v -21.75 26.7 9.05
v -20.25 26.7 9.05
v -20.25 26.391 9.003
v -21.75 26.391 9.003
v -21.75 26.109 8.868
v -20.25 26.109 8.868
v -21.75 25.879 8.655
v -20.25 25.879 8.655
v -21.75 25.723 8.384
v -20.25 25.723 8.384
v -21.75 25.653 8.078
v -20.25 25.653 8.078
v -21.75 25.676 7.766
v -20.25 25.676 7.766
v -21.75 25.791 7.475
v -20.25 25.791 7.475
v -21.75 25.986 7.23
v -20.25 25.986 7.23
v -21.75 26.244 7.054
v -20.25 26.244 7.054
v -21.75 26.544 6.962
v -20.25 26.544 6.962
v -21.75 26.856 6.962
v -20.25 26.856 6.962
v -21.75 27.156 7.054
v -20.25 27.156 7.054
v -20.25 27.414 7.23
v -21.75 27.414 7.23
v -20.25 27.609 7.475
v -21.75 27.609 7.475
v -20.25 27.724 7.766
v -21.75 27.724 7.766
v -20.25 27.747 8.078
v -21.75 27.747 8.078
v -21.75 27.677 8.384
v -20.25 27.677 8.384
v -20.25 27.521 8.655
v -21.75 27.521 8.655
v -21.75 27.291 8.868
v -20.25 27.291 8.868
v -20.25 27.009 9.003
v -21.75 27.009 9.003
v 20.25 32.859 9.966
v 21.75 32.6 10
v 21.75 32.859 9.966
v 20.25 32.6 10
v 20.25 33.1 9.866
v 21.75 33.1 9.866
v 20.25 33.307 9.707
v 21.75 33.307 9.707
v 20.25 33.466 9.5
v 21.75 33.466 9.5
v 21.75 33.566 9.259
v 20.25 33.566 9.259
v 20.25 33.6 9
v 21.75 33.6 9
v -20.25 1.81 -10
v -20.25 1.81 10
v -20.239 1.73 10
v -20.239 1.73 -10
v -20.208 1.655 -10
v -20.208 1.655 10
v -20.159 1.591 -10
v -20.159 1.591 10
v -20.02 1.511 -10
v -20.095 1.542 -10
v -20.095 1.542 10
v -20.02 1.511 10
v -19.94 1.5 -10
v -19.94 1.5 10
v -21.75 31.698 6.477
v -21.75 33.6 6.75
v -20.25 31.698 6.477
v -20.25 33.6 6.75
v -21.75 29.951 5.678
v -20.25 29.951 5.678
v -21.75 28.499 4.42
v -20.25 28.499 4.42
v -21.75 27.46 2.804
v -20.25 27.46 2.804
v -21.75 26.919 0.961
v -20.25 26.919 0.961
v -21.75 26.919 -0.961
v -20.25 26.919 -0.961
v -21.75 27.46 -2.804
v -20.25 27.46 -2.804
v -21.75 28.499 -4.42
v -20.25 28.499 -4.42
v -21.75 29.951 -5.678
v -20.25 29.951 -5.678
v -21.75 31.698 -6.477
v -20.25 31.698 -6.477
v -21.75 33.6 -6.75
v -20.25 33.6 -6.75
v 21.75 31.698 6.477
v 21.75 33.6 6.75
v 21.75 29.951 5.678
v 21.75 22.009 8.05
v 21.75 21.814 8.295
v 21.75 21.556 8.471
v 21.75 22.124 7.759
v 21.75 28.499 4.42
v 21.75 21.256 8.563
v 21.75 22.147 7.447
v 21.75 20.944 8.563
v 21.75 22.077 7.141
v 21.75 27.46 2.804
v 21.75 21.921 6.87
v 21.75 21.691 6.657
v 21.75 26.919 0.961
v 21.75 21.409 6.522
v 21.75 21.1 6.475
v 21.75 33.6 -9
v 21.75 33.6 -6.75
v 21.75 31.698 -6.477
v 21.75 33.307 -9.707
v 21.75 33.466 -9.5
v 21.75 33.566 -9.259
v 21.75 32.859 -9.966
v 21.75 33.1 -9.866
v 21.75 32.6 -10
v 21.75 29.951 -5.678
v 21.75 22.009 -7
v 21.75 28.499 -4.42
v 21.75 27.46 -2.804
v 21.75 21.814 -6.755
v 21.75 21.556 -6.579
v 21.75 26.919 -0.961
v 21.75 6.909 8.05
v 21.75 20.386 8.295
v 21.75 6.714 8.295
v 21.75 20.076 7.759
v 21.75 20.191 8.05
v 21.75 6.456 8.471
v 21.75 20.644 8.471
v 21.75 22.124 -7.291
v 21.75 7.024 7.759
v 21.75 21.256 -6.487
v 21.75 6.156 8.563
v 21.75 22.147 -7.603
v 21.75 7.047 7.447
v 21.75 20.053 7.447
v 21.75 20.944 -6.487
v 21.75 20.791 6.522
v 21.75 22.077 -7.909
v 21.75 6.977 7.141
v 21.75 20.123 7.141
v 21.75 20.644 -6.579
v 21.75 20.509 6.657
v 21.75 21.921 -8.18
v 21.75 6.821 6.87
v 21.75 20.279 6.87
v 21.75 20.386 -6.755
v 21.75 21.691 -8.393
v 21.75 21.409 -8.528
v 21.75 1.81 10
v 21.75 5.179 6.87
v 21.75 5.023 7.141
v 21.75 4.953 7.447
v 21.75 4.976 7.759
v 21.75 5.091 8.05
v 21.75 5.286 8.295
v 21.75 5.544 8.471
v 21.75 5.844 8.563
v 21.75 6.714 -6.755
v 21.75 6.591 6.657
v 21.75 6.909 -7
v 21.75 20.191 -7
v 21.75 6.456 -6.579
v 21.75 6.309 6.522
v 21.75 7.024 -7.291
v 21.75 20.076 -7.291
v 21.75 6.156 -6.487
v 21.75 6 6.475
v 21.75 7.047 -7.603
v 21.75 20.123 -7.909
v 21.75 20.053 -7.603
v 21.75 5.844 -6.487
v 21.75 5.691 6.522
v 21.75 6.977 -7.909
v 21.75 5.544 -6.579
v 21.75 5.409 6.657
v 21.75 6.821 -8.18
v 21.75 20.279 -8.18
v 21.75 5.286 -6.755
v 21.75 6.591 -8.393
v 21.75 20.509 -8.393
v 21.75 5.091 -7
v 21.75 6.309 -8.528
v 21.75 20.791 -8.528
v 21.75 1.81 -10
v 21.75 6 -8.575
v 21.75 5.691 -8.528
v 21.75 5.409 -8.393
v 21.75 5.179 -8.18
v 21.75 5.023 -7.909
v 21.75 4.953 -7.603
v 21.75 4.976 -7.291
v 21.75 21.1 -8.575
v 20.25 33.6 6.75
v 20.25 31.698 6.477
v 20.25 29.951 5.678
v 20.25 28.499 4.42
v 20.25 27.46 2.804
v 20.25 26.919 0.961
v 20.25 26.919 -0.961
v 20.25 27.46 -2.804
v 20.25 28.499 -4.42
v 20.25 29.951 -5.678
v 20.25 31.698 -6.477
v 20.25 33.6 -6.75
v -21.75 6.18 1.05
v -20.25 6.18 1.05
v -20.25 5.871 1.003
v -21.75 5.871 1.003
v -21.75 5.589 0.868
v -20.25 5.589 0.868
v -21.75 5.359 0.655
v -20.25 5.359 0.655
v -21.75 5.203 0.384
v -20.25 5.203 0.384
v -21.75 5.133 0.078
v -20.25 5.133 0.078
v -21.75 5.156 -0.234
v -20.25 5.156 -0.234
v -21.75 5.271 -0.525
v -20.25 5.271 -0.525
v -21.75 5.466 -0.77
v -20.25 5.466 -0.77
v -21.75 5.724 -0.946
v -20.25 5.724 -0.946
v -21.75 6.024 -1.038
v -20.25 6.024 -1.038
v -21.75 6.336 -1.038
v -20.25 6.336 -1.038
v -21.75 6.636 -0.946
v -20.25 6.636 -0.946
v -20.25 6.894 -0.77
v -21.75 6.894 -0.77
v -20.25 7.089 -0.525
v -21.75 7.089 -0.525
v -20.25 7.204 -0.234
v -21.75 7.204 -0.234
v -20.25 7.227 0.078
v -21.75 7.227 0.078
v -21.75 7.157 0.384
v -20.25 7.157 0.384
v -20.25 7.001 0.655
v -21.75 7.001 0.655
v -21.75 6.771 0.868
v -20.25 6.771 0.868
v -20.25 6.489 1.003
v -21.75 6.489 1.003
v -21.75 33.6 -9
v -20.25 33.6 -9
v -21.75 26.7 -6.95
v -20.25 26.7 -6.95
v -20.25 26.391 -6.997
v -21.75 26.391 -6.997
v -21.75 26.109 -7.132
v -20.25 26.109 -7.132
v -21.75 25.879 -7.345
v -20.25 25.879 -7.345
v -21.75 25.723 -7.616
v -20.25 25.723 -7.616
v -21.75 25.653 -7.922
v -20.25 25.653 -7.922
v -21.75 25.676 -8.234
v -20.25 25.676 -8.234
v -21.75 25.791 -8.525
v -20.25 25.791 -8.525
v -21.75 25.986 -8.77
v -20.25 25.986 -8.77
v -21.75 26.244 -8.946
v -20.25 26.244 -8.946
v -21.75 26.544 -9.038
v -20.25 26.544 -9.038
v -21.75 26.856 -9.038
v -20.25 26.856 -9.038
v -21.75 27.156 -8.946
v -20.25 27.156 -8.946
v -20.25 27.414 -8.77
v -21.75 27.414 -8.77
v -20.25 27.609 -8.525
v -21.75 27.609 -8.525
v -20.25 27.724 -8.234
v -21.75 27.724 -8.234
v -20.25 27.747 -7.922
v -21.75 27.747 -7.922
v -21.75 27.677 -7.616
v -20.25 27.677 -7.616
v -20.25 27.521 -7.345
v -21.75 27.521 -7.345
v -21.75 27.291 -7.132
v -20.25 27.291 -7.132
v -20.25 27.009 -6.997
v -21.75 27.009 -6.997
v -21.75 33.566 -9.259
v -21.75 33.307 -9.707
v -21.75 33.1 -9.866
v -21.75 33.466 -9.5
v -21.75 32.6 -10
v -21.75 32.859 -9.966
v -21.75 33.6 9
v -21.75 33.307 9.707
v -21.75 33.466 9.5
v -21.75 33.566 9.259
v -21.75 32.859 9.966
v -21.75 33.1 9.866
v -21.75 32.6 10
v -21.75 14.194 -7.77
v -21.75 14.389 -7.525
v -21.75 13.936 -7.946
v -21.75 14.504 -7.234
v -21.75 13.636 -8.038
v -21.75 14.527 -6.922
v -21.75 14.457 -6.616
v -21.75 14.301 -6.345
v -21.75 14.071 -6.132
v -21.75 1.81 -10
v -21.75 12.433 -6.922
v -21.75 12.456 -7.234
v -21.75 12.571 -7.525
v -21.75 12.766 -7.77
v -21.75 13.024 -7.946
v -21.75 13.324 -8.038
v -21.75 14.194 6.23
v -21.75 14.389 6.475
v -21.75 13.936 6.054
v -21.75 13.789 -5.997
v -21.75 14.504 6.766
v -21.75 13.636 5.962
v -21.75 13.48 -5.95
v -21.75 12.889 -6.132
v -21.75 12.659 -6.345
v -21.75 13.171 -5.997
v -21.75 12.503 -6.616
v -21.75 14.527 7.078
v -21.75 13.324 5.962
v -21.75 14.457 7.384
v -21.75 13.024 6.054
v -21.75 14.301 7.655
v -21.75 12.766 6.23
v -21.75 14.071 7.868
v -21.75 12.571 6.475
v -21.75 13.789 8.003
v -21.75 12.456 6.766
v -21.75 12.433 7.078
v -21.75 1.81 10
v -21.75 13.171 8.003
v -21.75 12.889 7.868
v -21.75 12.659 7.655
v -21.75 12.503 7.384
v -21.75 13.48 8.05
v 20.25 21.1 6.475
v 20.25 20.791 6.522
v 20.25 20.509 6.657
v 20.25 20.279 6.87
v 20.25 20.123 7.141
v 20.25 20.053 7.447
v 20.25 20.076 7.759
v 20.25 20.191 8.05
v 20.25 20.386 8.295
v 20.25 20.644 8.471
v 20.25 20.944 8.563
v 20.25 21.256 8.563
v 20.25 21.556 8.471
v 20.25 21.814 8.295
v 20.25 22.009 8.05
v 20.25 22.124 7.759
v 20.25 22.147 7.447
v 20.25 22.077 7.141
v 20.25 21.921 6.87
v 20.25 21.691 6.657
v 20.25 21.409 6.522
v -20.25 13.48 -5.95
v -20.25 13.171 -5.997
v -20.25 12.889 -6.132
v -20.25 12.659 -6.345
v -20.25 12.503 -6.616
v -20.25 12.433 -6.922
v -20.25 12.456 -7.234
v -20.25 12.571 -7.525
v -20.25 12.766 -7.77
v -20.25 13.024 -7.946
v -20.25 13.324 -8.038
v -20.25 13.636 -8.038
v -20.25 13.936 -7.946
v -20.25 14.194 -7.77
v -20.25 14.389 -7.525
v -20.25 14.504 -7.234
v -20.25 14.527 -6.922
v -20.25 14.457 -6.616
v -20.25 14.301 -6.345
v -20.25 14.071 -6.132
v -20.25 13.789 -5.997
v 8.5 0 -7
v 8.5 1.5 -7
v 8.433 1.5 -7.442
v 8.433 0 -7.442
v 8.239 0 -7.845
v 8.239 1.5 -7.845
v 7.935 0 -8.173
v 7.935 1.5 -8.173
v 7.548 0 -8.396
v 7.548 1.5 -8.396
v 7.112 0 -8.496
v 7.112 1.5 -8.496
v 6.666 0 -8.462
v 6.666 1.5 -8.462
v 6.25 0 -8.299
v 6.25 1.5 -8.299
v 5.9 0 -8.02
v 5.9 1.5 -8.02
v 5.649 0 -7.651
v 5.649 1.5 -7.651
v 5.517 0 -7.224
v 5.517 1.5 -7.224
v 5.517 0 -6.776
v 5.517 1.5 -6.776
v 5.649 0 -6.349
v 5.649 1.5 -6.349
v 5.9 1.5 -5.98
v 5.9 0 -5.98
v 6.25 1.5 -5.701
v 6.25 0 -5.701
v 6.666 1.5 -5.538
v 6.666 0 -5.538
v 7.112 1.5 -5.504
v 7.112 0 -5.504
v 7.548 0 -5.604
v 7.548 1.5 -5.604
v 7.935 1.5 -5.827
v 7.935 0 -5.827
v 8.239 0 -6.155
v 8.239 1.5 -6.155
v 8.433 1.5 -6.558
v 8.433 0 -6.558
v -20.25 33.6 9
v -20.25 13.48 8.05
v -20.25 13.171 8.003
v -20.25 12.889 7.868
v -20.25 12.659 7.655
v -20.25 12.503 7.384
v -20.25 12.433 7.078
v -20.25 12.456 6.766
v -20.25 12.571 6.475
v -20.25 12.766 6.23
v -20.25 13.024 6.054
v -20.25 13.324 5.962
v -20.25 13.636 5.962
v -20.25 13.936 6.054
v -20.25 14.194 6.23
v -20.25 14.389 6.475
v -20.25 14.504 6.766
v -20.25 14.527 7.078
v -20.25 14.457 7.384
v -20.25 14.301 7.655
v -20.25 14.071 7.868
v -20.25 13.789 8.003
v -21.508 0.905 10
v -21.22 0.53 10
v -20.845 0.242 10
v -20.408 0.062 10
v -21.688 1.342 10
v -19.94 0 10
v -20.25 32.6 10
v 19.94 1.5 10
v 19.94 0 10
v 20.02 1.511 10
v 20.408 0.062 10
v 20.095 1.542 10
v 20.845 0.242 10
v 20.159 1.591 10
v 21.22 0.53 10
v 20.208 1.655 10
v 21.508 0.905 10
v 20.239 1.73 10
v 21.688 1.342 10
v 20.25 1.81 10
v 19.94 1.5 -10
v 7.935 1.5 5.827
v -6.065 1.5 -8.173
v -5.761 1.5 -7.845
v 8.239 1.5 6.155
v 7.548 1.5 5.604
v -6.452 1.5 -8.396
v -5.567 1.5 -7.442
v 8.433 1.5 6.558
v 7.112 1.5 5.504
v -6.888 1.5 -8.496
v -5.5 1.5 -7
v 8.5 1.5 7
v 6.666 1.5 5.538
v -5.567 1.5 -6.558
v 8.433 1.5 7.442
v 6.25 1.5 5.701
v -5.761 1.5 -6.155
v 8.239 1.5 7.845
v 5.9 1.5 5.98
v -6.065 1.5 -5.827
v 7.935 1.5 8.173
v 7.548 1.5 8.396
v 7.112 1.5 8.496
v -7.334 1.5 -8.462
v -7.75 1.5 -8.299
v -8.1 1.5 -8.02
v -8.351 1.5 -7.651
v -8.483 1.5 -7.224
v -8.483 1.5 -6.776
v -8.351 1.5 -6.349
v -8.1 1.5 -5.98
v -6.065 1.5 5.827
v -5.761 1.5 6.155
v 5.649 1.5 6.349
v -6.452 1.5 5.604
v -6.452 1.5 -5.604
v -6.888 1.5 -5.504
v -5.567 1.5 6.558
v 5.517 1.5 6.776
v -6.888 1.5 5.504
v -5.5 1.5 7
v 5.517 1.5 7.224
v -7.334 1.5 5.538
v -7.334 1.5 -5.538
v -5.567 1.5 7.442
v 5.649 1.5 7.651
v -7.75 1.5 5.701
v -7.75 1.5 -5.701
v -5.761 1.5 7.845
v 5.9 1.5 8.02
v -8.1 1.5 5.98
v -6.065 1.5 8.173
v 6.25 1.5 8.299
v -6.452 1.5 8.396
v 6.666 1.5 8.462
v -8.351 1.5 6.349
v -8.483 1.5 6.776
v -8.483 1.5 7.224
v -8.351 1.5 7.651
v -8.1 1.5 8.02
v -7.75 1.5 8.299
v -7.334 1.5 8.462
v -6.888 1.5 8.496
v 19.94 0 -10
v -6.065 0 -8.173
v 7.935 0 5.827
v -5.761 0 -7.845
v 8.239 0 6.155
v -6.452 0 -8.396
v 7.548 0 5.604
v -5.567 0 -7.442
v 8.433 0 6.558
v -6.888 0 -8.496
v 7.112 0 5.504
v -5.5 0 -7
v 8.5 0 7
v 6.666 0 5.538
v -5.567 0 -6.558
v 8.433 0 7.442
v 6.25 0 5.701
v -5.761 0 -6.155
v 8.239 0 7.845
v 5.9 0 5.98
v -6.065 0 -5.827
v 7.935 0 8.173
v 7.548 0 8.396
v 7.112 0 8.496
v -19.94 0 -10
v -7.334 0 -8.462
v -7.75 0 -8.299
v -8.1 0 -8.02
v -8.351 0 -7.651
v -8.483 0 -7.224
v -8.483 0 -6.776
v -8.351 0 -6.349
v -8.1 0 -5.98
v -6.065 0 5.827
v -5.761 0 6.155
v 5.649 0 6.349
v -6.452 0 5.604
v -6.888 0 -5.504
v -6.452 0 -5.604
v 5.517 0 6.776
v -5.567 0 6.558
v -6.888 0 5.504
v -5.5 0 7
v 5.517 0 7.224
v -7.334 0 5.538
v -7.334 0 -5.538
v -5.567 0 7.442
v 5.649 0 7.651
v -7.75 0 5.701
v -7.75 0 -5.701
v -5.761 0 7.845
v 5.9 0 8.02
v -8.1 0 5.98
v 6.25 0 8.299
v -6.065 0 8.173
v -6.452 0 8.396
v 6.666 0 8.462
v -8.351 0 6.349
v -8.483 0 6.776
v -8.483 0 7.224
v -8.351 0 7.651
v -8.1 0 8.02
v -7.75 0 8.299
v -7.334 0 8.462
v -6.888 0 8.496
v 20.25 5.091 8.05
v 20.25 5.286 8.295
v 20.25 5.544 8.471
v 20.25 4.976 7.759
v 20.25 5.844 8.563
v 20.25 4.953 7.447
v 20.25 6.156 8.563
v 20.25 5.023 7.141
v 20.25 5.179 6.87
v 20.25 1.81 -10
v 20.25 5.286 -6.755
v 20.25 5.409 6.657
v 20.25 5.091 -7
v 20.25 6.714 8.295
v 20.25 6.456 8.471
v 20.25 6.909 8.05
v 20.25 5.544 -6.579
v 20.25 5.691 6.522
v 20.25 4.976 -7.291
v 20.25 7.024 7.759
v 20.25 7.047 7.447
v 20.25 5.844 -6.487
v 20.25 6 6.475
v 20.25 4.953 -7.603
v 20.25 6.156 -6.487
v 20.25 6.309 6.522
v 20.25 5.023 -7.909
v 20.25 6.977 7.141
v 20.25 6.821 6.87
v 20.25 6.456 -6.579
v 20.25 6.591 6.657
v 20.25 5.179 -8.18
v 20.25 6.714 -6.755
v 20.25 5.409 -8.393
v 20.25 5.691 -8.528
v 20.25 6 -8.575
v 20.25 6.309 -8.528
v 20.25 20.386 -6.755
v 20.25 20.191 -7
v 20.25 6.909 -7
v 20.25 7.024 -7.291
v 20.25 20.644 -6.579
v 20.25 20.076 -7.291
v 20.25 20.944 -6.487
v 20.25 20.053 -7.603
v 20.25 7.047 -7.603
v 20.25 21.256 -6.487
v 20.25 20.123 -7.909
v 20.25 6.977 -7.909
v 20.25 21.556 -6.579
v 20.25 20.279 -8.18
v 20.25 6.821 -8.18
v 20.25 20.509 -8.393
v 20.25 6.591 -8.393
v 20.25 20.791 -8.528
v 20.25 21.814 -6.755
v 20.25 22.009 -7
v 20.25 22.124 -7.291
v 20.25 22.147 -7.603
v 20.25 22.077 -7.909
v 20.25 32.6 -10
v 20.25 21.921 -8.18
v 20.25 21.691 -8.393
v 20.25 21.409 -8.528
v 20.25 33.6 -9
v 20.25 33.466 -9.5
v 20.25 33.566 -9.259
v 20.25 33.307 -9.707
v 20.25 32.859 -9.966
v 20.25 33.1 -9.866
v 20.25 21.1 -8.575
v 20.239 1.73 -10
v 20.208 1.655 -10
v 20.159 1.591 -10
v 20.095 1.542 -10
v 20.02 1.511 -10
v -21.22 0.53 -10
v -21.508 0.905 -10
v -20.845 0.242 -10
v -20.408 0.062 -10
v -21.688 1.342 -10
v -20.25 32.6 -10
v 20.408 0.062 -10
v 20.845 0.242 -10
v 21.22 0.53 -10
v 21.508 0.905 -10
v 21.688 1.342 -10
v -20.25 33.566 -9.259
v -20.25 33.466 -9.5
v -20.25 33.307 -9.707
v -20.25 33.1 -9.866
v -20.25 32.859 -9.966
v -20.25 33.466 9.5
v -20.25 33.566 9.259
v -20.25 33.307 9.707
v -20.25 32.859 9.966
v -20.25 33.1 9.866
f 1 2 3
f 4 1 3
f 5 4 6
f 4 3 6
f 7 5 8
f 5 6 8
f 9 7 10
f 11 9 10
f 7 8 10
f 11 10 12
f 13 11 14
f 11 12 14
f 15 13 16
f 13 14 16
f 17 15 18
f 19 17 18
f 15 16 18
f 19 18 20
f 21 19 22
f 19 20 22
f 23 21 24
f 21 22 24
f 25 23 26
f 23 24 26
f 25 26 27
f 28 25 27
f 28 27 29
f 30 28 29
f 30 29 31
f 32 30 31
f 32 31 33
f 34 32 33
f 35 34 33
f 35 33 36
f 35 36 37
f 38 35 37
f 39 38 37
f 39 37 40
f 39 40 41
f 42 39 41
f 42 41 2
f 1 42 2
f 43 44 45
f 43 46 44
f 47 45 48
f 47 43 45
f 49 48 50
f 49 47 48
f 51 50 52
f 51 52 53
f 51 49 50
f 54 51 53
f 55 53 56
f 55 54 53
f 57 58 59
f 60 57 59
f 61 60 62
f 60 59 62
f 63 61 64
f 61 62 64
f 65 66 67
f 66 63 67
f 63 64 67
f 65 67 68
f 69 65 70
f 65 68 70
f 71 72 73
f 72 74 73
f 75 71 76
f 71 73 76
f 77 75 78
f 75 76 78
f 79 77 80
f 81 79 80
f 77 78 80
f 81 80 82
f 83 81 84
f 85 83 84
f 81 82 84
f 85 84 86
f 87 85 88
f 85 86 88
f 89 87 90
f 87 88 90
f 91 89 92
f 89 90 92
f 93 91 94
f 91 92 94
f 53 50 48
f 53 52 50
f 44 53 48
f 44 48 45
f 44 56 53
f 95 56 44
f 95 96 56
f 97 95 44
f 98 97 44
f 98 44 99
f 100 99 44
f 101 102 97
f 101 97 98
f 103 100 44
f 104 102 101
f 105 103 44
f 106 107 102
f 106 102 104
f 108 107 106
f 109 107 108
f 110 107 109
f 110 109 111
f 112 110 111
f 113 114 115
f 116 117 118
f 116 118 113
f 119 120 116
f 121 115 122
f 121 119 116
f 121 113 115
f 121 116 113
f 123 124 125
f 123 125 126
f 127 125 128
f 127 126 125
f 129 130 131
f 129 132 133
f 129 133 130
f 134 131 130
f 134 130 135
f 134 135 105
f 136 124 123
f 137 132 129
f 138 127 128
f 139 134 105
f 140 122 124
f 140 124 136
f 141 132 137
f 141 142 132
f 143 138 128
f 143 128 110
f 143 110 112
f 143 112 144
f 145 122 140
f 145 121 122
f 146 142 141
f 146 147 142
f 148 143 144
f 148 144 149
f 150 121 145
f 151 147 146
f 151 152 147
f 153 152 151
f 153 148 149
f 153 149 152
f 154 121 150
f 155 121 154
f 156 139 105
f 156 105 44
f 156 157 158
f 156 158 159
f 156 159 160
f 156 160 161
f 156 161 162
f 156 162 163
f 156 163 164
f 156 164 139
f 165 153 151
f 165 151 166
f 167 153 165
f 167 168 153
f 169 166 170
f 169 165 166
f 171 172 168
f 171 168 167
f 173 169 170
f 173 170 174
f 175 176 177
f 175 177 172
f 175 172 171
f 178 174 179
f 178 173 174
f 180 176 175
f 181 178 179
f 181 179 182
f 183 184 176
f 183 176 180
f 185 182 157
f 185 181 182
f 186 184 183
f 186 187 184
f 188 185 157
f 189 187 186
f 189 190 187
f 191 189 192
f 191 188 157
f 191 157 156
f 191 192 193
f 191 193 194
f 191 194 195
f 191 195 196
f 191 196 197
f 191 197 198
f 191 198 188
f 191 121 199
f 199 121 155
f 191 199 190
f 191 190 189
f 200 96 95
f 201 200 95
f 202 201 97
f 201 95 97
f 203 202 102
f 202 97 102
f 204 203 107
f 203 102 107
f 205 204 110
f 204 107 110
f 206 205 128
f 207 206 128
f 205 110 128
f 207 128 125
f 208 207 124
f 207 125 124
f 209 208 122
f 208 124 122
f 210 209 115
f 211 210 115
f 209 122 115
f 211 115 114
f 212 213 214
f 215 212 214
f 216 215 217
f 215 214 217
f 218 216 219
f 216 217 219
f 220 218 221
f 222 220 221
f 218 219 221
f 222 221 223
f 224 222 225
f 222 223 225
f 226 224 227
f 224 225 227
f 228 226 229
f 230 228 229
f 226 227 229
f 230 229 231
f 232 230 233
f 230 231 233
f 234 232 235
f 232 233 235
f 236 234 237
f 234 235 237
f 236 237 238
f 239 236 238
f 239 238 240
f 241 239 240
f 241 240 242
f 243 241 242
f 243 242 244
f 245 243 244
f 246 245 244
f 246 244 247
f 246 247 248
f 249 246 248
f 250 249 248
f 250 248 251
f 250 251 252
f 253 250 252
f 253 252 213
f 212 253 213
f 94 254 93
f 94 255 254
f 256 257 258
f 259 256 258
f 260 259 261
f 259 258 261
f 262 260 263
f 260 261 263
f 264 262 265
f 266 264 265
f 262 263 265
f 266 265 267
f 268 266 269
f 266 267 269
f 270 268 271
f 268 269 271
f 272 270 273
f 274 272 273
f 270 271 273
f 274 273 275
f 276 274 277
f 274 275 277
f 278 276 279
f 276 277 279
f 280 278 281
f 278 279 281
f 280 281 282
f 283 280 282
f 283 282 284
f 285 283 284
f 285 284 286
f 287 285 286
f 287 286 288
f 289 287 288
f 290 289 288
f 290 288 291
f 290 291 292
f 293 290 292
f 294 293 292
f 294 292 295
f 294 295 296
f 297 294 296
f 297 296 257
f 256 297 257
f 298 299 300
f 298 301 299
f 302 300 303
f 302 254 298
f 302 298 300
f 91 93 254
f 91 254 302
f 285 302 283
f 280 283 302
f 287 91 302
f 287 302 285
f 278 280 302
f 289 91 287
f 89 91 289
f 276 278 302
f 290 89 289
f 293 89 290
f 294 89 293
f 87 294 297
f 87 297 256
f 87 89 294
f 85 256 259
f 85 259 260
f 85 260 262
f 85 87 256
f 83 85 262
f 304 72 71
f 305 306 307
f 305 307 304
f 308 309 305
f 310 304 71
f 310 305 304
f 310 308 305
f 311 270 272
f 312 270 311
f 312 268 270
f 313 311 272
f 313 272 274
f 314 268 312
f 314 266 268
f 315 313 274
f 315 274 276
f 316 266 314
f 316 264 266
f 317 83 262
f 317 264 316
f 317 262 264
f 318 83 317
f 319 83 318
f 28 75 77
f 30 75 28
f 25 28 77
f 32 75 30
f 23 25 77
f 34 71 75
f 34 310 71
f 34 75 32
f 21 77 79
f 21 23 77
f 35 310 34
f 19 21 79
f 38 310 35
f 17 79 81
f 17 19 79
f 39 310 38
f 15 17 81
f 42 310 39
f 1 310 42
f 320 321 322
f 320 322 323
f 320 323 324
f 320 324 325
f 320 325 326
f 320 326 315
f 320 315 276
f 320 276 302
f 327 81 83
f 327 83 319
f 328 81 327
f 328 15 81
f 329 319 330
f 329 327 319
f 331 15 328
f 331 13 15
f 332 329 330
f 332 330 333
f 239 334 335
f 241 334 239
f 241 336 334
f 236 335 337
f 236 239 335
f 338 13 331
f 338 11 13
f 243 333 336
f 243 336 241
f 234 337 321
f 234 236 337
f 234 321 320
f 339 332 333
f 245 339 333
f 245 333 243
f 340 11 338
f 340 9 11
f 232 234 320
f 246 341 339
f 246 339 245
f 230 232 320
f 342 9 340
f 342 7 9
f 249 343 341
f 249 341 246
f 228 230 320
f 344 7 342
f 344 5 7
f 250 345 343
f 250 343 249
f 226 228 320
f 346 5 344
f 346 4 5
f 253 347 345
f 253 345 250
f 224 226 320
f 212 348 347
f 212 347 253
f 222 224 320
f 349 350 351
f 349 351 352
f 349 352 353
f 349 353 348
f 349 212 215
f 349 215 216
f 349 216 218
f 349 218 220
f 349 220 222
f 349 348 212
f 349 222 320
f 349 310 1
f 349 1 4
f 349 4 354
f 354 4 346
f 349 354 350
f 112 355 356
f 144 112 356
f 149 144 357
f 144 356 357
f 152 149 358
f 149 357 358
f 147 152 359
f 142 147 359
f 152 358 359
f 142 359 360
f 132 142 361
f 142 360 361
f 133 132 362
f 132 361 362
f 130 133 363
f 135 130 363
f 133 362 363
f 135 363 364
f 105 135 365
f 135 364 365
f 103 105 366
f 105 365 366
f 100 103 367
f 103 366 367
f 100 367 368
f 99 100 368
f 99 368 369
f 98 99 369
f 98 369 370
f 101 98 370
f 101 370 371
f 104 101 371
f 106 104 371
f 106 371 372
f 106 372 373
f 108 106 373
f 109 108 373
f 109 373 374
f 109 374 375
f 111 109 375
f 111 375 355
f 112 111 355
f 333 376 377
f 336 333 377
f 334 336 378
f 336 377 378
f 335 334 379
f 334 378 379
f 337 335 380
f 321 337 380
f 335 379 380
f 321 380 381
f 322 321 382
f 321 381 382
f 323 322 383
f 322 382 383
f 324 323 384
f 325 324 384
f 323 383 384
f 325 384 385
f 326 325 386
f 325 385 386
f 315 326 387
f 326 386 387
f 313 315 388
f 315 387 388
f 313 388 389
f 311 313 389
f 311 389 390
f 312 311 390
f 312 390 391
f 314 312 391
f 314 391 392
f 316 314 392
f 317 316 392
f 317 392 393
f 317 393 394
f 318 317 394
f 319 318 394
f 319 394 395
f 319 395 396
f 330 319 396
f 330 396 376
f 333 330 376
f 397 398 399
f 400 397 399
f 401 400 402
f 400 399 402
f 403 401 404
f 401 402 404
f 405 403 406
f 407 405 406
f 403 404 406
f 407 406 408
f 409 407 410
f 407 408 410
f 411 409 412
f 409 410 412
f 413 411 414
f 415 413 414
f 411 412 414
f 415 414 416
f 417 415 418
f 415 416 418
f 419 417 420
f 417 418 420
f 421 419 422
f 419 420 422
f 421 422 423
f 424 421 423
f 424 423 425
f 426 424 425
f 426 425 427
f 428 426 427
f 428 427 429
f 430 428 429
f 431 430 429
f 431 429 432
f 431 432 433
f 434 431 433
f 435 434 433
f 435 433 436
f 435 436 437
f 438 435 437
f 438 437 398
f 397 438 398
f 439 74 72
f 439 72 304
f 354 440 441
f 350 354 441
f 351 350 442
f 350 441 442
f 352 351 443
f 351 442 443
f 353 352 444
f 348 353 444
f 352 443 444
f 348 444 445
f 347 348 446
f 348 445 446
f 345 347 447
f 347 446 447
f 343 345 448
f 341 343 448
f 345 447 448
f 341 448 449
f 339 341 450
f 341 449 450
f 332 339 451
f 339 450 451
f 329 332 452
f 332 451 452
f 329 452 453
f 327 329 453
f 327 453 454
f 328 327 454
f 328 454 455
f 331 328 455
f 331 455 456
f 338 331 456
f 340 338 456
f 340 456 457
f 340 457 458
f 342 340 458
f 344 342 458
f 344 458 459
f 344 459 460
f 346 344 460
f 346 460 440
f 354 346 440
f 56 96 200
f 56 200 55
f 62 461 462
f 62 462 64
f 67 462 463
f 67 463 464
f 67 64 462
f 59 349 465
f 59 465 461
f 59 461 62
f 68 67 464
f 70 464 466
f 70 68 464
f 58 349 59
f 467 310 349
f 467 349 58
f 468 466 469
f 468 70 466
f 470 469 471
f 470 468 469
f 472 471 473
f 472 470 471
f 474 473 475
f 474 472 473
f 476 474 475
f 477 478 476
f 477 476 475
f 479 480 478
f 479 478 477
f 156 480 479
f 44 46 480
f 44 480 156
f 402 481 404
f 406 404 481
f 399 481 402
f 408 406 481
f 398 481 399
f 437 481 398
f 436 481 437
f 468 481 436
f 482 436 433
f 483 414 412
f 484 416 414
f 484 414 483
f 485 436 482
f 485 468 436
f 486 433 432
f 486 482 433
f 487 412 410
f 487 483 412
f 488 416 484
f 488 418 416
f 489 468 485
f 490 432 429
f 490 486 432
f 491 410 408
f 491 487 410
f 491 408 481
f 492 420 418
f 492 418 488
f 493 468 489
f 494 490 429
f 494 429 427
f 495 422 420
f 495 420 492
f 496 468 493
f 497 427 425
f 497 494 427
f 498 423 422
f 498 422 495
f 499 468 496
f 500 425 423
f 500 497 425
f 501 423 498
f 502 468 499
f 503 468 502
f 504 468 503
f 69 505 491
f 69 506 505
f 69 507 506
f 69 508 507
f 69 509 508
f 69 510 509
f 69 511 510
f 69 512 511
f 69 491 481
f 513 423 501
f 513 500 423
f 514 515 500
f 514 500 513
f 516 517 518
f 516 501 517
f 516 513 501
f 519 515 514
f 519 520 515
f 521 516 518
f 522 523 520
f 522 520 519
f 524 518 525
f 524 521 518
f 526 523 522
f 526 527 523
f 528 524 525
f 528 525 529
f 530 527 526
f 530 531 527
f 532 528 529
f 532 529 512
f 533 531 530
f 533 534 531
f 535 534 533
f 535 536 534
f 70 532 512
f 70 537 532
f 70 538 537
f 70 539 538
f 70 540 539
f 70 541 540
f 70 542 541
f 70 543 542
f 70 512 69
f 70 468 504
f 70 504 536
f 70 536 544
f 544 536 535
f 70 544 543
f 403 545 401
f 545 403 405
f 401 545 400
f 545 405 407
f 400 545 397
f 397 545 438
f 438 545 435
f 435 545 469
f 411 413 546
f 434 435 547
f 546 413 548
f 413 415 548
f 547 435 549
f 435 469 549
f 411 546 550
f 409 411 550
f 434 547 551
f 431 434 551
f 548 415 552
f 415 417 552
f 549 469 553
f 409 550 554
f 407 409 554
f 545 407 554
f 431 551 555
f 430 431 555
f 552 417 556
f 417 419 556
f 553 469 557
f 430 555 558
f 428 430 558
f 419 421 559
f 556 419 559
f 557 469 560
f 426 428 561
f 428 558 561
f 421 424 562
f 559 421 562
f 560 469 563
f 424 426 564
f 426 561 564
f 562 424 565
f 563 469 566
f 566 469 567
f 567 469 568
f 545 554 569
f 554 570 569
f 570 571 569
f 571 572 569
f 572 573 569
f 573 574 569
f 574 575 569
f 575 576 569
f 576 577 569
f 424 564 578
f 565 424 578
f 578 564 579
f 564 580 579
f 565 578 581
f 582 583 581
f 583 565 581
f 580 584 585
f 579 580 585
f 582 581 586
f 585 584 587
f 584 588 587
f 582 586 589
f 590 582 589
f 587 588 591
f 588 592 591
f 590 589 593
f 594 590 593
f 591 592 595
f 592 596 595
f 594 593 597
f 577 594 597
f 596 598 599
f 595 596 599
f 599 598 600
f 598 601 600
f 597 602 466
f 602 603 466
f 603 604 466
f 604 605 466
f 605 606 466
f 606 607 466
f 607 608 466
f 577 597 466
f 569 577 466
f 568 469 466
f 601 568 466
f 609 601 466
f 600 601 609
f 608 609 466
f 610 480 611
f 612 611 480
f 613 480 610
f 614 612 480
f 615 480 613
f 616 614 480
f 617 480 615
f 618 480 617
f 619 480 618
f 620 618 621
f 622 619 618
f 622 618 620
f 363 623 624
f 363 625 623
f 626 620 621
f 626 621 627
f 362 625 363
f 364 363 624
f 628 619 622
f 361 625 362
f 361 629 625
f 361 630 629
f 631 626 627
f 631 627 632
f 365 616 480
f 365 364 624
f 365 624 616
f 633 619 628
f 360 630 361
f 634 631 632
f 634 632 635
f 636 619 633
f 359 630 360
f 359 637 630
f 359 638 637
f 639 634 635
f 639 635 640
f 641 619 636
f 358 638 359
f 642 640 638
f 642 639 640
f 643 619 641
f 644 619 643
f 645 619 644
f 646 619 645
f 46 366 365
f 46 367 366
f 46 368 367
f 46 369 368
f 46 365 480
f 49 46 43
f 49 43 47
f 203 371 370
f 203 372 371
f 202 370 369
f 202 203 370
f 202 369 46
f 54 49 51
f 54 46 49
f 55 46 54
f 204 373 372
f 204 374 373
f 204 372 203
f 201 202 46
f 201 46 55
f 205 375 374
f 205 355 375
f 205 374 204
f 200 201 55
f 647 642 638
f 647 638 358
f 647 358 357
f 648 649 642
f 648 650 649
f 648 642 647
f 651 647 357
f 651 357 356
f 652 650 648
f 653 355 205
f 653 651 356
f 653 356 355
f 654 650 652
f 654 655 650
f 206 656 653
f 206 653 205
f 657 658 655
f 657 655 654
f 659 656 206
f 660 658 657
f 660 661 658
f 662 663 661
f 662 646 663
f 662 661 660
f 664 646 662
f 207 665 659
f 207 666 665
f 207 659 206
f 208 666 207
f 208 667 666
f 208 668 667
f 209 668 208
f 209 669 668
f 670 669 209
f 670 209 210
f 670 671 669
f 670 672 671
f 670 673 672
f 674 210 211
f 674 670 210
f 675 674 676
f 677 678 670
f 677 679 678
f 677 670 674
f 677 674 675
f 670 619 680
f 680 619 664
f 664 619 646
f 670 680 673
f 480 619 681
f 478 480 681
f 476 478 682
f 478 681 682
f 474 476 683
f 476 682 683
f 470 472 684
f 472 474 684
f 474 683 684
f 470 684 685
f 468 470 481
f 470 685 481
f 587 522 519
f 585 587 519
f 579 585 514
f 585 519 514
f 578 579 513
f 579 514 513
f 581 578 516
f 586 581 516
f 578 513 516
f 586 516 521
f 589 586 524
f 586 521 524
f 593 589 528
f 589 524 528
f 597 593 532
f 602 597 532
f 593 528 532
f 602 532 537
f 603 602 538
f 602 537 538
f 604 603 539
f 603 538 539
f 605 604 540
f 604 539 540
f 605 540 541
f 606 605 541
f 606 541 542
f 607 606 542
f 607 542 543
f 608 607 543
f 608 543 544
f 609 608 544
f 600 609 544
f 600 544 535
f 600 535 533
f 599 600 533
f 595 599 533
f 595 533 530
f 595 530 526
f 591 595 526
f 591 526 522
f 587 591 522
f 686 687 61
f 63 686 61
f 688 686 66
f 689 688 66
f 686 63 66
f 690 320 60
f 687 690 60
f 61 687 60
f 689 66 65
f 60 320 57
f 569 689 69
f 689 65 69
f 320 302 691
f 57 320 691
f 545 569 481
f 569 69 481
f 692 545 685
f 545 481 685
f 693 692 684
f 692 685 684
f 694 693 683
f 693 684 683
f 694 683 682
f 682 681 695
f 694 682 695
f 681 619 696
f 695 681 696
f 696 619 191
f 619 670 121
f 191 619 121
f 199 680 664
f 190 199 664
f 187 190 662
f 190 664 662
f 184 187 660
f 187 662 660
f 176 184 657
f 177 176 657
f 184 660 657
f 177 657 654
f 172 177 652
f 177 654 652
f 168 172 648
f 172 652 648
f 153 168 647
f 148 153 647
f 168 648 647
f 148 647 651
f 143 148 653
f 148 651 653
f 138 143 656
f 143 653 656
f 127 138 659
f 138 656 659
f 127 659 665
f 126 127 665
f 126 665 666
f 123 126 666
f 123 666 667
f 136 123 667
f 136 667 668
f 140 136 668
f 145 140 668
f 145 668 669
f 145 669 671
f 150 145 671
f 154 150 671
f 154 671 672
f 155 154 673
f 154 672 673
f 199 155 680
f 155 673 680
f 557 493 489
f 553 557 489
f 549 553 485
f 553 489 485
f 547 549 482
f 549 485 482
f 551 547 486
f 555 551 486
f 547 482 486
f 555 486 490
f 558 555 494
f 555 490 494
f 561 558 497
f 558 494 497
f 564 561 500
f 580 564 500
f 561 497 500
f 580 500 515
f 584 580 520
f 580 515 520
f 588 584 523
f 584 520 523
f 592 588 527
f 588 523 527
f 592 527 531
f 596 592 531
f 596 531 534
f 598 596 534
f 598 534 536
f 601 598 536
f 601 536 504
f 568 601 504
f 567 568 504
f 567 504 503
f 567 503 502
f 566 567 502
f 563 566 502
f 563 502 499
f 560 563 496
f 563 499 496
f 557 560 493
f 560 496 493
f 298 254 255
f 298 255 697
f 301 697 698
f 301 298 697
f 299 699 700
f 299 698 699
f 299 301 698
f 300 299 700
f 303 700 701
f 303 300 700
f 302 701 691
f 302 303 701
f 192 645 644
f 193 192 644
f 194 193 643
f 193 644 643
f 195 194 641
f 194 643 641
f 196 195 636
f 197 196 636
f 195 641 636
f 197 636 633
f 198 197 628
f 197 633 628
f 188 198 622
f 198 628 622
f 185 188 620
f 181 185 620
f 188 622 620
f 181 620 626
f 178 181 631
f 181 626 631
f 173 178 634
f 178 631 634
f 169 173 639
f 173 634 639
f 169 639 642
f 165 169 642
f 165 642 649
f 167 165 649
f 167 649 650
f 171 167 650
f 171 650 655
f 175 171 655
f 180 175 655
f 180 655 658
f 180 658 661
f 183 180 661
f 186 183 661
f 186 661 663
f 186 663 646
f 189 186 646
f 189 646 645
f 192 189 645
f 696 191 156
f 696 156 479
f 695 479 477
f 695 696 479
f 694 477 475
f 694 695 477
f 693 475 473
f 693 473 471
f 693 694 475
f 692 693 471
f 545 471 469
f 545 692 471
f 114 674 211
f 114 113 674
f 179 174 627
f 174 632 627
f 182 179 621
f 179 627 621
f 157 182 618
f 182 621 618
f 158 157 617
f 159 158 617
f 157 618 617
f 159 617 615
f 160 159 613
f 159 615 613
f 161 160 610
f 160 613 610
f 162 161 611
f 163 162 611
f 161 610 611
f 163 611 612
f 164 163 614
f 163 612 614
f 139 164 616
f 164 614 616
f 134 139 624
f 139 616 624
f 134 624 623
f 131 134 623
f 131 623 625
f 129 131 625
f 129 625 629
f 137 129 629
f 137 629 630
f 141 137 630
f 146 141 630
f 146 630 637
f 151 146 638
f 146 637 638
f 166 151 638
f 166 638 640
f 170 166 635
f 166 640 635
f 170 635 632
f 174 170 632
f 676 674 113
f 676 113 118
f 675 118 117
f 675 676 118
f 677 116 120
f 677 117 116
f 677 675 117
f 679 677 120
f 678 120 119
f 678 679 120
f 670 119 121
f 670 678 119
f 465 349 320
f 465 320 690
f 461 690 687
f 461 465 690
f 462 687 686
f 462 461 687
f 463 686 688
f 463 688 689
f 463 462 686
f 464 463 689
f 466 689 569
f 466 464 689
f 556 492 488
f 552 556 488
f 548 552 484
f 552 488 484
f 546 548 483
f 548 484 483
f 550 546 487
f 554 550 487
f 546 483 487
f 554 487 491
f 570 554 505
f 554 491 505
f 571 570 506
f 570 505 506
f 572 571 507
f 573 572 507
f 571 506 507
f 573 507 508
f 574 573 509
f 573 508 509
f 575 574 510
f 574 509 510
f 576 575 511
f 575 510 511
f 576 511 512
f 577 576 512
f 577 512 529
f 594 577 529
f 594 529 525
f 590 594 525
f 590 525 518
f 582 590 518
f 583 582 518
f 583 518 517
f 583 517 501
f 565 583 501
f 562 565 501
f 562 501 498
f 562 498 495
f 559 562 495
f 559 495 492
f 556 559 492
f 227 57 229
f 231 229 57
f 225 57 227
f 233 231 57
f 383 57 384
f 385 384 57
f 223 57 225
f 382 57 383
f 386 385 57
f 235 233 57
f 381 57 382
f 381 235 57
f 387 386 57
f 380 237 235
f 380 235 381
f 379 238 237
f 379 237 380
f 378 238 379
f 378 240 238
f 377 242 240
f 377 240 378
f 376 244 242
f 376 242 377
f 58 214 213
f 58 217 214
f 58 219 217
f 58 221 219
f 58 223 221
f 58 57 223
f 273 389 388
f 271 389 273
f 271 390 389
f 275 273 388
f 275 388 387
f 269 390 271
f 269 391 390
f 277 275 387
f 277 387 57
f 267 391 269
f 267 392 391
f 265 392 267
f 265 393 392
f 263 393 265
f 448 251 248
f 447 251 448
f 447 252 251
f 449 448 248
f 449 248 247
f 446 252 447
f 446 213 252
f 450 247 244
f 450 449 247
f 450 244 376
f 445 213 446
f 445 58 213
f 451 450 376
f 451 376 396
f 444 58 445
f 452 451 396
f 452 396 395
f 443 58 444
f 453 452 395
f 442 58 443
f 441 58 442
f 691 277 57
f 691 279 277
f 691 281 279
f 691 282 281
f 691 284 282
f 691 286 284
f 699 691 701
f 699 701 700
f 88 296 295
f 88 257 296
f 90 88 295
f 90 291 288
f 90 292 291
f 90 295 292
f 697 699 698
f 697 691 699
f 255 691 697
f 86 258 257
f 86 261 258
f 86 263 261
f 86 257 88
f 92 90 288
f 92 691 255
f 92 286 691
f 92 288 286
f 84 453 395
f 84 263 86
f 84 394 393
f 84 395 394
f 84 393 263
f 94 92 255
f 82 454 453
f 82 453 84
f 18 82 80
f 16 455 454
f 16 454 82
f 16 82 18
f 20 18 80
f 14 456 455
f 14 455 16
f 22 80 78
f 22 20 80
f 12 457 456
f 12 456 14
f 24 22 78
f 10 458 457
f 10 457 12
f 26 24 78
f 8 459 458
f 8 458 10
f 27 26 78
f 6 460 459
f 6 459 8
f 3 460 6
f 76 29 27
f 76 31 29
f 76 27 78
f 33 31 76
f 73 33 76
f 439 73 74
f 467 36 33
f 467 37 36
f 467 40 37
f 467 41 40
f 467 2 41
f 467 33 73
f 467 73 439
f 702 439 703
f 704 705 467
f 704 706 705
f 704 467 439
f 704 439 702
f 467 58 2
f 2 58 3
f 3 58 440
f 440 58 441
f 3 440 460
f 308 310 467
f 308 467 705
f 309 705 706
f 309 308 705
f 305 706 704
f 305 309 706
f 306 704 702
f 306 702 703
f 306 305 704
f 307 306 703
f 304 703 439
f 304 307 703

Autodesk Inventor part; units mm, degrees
ref_plane "YZ Plane" through (0, 0, 0) normal (1, 0, 0) x (0, 1, 0)
ref_plane "XZ Plane" through (0, 0, 0) normal (0, 1, 0) x (-1, 0, 0)
ref_plane "XY Plane" through (0, 0, 0) normal (0, 0, 1) x (1, 0, 0)
sketch "Sketch1" plane through (0, 0, 0) normal (0, 1, 0) x (-1, 0, 0)
  line L0 (20.25, -10) -> (-20.25, -10)
  line L1 (-20.25, -10) -> (-20.25, 10)
  line L2 (-20.25, 10) -> (20.25, 10)
  line L3 (20.25, 10) -> (20.25, -10)
  point P0 (0, 0)
  dimension "d0" = 40.5
  dimension "d1" = 20
  dimension "d2" = 10
  dimension "d3" = 20.25
extrude "Plate1" add sketch "Sketch1" along normal blind 1.5
sketch "Sketch2" plane through (21.75, 0, -10) normal (-1, 0, 0) x (0, -1, 0)
  line L0 (0, 20) -> (0, 0)
  line L1 (0, 0) -> (-43.5, 0)
  line L2 (-43.5, 0) -> (-43.5, 20)
  line L3 (-43.5, 20) -> (0, 20)
edge flange "Flange1" height 43.5 angle 90 thickness 1.5 bend radius 0.31 thickness toward (-1, 0, 0) relief tear relief width 1.5 relief depth 0.75 edges at (20.25, 1.5, 0) wall of the first edge with corners at (21.75, 0, 10) (21.75, 0, -10) (21.75, 43.5, -10) (21.75, 43.5, 10)
bend "Bend1"
corner "Corner1"
sketch "Sketch3" plane through (-21.75, 0, 10) normal (1, 0, 0) x (0, 1, 0)
  line L0 (0, -20) -> (0, 0)
  line L1 (0, 0) -> (43.5, 0)
  line L2 (43.5, 0) -> (43.5, -20)
  line L3 (43.5, -20) -> (0, -20)
edge flange "Flange2" height 43.5 angle 90 thickness 1.5 bend radius 0.31 thickness toward (1, 0, 0) relief tear relief width 1.5 relief depth 0.75 edges at (-20.25, 1.5, 0) wall of the first edge with corners at (-21.75, 0, -10) (-21.75, 0, 10) (-21.75, 43.5, 10) (-21.75, 43.5, -10)
bend "Bend2"
corner "Corner2"
sketch "Sketch4" plane through (21.75, 43.5, 10) normal (1, 0, 0) x (0, 0, -1)
  circle A0 centre (10, -9.9) radius 6.75
  line L0 (0, 0) -> (20, 0) projected
  line L1 (20, 0) -> (20, -41.69) projected
  point P0 (10, -43.5)
  dimension "d25" = 9.9
  dimension "d26" = 13.5
  dimension "d27" = 10
extrude "Extrusion1" cut sketch "Sketch4" against normal blind 50
sketch "Sketch5" plane through (21.75, 43.5, 10) normal (1, 0, 0) x (0, 0, -1)
  circle A0 centre (10, -9.9) radius 6.75 projected
  line L0 (0, 0) -> (20, 0) projected
  line L1 (-4, 0) -> (24, 0)
  line L2 (24, 0) -> (24, -9.9)
  line L3 (24, -9.9) -> (-4, -9.9)
  line L4 (-4, -9.9) -> (-4, 0)
  line L5 (0, -41.69) -> (0, 0) projected
  point P0 (10, -43.5)
  point P1 (20, 0)
  dimension "d30" = 9.9
  dimension "d31" = 28
  dimension "d32" = 4
extrude "Extrusion2" cut sketch "Sketch5" against normal blind 50 contours L3 A0 | A0 L3 L5 L0 L1 L2 | L3 L4 L1 L5 picked at (11.6841, -8.408)
fillet "Fillet1" radius 1 4 edges at (-21, 33.6, 10) (-21, 33.6, -10) (21, 33.6, -10) (21, 33.6, 10)
sketch "Sketch11" plane through (0, 1.5, 0) normal (0, 1, 0) x (1, 0, 0)
  circle A0 centre (7, 7) radius 1.5
  line L0 (-19.94, 10) -> (19.94, 10) projected
  line L1 (-19.94, 10) -> (-19.94, -10) projected
  circle A1 centre (-7, 7) radius 1.5
  circle A2 centre (7, -7) radius 1.5
  circle A3 centre (-7, -7) radius 1.5
  point P0 (0, 0)
  dimension "d71" = 7
  dimension "d72" = 3
  dimension "d73" = 7
  dimension "d76" = 14
  dimension "d79" = 14
extrude "Extrusion3" cut sketch "Sketch11" against normal through all
sketch "Sketch12" plane through (-21.75, 1.81, -10) normal (-1, 0, 0) x (0, 0, 1)
  circle A0 centre (18, 24.89) radius 0.7835
  circle A1 centre (10, 24.79) radius 0.7835
  circle A2 centre (17, 11.67) radius 0.7835
  circle A3 centre (3, 11.67) radius 0.7835
  circle A4 centre (10, 4.37) radius 0.7835
  circle A5 centre (2, 24.89) radius 0.7835
  point P0 (10, -1.81)
hole "Hole6" at (-21.75, 26.7, -8) at (-21.75, 26.7, 8) at (-21.75, 13.48, 7) at (-21.75, 6.18, 0) at (-21.75, 13.48, -7) direction (1, 0, 0) diameter 2.1 depth 1.5
sketch "Sketch13" plane through (21.75, 1.81, 10) normal (1, 0, 0) x (0, 0, -1)
  circle A0 centre (17.525, 4.19) radius 0.7835
  circle A1 centre (2.475, 4.19) radius 0.7835
  circle A2 centre (2.475, 19.29) radius 0.7835
  circle A3 centre (17.525, 19.29) radius 0.7835
  point P0 (10, -1.81)
hole "Hole7" at (21.75, 21.1, 7.525) at (21.75, 21.1, -7.525) at (21.75, 6, -7.525) at (21.75, 6, 7.525) direction (-1, 0, 0) diameter 2.1 depth 1.5
equation "\"d89\" = Thickness"
equation "\"d96\" = Thickness"
equation "\"d4\" = Thickness"
equation "\"d5\" = BendReliefWidth"
equation "\"d6\" = BendReliefDepth"
equation "\"d7\" = MinimumRemnant"
equation "\"d8\" = TransitionRadius"
equation "\"d11\" = BendRadius"
equation "\"d12\" = CornerReliefSize"
equation "\"d13\" = GapSize"
equation "\"d14\" = JacobiRadiusSize"
equation "\"d15\" = BendReliefWidth"
equation "\"d16\" = BendReliefDepth"
equation "\"d17\" = MinimumRemnant"
equation "\"d18\" = TransitionRadius"
equation "\"d21\" = BendRadius"
equation "\"d22\" = CornerReliefSize"
equation "\"d23\" = GapSize"
equation "\"d24\" = JacobiRadiusSize"
equation "\"BendReliefWidth\" = Thickness"
equation "\"BendReliefDepth\" = 0.5 * Thickness"
equation "\"CornerReliefSize\" = 4 * Thickness"
equation "\"MinimumRemnant\" = 2 * Thickness"
equation "\"TransitionRadius\" = BendRadius"
equation "\"JacobiRadiusSize\" = BendRadius"
equation "\"GapSize\" = Thickness"
equation "\"Thickness\" = 1.5"
equation "\"BendRadius\" = 0.31"
properties part number "axis_10_top_frame" material "Aluminum 6061-AHC"
